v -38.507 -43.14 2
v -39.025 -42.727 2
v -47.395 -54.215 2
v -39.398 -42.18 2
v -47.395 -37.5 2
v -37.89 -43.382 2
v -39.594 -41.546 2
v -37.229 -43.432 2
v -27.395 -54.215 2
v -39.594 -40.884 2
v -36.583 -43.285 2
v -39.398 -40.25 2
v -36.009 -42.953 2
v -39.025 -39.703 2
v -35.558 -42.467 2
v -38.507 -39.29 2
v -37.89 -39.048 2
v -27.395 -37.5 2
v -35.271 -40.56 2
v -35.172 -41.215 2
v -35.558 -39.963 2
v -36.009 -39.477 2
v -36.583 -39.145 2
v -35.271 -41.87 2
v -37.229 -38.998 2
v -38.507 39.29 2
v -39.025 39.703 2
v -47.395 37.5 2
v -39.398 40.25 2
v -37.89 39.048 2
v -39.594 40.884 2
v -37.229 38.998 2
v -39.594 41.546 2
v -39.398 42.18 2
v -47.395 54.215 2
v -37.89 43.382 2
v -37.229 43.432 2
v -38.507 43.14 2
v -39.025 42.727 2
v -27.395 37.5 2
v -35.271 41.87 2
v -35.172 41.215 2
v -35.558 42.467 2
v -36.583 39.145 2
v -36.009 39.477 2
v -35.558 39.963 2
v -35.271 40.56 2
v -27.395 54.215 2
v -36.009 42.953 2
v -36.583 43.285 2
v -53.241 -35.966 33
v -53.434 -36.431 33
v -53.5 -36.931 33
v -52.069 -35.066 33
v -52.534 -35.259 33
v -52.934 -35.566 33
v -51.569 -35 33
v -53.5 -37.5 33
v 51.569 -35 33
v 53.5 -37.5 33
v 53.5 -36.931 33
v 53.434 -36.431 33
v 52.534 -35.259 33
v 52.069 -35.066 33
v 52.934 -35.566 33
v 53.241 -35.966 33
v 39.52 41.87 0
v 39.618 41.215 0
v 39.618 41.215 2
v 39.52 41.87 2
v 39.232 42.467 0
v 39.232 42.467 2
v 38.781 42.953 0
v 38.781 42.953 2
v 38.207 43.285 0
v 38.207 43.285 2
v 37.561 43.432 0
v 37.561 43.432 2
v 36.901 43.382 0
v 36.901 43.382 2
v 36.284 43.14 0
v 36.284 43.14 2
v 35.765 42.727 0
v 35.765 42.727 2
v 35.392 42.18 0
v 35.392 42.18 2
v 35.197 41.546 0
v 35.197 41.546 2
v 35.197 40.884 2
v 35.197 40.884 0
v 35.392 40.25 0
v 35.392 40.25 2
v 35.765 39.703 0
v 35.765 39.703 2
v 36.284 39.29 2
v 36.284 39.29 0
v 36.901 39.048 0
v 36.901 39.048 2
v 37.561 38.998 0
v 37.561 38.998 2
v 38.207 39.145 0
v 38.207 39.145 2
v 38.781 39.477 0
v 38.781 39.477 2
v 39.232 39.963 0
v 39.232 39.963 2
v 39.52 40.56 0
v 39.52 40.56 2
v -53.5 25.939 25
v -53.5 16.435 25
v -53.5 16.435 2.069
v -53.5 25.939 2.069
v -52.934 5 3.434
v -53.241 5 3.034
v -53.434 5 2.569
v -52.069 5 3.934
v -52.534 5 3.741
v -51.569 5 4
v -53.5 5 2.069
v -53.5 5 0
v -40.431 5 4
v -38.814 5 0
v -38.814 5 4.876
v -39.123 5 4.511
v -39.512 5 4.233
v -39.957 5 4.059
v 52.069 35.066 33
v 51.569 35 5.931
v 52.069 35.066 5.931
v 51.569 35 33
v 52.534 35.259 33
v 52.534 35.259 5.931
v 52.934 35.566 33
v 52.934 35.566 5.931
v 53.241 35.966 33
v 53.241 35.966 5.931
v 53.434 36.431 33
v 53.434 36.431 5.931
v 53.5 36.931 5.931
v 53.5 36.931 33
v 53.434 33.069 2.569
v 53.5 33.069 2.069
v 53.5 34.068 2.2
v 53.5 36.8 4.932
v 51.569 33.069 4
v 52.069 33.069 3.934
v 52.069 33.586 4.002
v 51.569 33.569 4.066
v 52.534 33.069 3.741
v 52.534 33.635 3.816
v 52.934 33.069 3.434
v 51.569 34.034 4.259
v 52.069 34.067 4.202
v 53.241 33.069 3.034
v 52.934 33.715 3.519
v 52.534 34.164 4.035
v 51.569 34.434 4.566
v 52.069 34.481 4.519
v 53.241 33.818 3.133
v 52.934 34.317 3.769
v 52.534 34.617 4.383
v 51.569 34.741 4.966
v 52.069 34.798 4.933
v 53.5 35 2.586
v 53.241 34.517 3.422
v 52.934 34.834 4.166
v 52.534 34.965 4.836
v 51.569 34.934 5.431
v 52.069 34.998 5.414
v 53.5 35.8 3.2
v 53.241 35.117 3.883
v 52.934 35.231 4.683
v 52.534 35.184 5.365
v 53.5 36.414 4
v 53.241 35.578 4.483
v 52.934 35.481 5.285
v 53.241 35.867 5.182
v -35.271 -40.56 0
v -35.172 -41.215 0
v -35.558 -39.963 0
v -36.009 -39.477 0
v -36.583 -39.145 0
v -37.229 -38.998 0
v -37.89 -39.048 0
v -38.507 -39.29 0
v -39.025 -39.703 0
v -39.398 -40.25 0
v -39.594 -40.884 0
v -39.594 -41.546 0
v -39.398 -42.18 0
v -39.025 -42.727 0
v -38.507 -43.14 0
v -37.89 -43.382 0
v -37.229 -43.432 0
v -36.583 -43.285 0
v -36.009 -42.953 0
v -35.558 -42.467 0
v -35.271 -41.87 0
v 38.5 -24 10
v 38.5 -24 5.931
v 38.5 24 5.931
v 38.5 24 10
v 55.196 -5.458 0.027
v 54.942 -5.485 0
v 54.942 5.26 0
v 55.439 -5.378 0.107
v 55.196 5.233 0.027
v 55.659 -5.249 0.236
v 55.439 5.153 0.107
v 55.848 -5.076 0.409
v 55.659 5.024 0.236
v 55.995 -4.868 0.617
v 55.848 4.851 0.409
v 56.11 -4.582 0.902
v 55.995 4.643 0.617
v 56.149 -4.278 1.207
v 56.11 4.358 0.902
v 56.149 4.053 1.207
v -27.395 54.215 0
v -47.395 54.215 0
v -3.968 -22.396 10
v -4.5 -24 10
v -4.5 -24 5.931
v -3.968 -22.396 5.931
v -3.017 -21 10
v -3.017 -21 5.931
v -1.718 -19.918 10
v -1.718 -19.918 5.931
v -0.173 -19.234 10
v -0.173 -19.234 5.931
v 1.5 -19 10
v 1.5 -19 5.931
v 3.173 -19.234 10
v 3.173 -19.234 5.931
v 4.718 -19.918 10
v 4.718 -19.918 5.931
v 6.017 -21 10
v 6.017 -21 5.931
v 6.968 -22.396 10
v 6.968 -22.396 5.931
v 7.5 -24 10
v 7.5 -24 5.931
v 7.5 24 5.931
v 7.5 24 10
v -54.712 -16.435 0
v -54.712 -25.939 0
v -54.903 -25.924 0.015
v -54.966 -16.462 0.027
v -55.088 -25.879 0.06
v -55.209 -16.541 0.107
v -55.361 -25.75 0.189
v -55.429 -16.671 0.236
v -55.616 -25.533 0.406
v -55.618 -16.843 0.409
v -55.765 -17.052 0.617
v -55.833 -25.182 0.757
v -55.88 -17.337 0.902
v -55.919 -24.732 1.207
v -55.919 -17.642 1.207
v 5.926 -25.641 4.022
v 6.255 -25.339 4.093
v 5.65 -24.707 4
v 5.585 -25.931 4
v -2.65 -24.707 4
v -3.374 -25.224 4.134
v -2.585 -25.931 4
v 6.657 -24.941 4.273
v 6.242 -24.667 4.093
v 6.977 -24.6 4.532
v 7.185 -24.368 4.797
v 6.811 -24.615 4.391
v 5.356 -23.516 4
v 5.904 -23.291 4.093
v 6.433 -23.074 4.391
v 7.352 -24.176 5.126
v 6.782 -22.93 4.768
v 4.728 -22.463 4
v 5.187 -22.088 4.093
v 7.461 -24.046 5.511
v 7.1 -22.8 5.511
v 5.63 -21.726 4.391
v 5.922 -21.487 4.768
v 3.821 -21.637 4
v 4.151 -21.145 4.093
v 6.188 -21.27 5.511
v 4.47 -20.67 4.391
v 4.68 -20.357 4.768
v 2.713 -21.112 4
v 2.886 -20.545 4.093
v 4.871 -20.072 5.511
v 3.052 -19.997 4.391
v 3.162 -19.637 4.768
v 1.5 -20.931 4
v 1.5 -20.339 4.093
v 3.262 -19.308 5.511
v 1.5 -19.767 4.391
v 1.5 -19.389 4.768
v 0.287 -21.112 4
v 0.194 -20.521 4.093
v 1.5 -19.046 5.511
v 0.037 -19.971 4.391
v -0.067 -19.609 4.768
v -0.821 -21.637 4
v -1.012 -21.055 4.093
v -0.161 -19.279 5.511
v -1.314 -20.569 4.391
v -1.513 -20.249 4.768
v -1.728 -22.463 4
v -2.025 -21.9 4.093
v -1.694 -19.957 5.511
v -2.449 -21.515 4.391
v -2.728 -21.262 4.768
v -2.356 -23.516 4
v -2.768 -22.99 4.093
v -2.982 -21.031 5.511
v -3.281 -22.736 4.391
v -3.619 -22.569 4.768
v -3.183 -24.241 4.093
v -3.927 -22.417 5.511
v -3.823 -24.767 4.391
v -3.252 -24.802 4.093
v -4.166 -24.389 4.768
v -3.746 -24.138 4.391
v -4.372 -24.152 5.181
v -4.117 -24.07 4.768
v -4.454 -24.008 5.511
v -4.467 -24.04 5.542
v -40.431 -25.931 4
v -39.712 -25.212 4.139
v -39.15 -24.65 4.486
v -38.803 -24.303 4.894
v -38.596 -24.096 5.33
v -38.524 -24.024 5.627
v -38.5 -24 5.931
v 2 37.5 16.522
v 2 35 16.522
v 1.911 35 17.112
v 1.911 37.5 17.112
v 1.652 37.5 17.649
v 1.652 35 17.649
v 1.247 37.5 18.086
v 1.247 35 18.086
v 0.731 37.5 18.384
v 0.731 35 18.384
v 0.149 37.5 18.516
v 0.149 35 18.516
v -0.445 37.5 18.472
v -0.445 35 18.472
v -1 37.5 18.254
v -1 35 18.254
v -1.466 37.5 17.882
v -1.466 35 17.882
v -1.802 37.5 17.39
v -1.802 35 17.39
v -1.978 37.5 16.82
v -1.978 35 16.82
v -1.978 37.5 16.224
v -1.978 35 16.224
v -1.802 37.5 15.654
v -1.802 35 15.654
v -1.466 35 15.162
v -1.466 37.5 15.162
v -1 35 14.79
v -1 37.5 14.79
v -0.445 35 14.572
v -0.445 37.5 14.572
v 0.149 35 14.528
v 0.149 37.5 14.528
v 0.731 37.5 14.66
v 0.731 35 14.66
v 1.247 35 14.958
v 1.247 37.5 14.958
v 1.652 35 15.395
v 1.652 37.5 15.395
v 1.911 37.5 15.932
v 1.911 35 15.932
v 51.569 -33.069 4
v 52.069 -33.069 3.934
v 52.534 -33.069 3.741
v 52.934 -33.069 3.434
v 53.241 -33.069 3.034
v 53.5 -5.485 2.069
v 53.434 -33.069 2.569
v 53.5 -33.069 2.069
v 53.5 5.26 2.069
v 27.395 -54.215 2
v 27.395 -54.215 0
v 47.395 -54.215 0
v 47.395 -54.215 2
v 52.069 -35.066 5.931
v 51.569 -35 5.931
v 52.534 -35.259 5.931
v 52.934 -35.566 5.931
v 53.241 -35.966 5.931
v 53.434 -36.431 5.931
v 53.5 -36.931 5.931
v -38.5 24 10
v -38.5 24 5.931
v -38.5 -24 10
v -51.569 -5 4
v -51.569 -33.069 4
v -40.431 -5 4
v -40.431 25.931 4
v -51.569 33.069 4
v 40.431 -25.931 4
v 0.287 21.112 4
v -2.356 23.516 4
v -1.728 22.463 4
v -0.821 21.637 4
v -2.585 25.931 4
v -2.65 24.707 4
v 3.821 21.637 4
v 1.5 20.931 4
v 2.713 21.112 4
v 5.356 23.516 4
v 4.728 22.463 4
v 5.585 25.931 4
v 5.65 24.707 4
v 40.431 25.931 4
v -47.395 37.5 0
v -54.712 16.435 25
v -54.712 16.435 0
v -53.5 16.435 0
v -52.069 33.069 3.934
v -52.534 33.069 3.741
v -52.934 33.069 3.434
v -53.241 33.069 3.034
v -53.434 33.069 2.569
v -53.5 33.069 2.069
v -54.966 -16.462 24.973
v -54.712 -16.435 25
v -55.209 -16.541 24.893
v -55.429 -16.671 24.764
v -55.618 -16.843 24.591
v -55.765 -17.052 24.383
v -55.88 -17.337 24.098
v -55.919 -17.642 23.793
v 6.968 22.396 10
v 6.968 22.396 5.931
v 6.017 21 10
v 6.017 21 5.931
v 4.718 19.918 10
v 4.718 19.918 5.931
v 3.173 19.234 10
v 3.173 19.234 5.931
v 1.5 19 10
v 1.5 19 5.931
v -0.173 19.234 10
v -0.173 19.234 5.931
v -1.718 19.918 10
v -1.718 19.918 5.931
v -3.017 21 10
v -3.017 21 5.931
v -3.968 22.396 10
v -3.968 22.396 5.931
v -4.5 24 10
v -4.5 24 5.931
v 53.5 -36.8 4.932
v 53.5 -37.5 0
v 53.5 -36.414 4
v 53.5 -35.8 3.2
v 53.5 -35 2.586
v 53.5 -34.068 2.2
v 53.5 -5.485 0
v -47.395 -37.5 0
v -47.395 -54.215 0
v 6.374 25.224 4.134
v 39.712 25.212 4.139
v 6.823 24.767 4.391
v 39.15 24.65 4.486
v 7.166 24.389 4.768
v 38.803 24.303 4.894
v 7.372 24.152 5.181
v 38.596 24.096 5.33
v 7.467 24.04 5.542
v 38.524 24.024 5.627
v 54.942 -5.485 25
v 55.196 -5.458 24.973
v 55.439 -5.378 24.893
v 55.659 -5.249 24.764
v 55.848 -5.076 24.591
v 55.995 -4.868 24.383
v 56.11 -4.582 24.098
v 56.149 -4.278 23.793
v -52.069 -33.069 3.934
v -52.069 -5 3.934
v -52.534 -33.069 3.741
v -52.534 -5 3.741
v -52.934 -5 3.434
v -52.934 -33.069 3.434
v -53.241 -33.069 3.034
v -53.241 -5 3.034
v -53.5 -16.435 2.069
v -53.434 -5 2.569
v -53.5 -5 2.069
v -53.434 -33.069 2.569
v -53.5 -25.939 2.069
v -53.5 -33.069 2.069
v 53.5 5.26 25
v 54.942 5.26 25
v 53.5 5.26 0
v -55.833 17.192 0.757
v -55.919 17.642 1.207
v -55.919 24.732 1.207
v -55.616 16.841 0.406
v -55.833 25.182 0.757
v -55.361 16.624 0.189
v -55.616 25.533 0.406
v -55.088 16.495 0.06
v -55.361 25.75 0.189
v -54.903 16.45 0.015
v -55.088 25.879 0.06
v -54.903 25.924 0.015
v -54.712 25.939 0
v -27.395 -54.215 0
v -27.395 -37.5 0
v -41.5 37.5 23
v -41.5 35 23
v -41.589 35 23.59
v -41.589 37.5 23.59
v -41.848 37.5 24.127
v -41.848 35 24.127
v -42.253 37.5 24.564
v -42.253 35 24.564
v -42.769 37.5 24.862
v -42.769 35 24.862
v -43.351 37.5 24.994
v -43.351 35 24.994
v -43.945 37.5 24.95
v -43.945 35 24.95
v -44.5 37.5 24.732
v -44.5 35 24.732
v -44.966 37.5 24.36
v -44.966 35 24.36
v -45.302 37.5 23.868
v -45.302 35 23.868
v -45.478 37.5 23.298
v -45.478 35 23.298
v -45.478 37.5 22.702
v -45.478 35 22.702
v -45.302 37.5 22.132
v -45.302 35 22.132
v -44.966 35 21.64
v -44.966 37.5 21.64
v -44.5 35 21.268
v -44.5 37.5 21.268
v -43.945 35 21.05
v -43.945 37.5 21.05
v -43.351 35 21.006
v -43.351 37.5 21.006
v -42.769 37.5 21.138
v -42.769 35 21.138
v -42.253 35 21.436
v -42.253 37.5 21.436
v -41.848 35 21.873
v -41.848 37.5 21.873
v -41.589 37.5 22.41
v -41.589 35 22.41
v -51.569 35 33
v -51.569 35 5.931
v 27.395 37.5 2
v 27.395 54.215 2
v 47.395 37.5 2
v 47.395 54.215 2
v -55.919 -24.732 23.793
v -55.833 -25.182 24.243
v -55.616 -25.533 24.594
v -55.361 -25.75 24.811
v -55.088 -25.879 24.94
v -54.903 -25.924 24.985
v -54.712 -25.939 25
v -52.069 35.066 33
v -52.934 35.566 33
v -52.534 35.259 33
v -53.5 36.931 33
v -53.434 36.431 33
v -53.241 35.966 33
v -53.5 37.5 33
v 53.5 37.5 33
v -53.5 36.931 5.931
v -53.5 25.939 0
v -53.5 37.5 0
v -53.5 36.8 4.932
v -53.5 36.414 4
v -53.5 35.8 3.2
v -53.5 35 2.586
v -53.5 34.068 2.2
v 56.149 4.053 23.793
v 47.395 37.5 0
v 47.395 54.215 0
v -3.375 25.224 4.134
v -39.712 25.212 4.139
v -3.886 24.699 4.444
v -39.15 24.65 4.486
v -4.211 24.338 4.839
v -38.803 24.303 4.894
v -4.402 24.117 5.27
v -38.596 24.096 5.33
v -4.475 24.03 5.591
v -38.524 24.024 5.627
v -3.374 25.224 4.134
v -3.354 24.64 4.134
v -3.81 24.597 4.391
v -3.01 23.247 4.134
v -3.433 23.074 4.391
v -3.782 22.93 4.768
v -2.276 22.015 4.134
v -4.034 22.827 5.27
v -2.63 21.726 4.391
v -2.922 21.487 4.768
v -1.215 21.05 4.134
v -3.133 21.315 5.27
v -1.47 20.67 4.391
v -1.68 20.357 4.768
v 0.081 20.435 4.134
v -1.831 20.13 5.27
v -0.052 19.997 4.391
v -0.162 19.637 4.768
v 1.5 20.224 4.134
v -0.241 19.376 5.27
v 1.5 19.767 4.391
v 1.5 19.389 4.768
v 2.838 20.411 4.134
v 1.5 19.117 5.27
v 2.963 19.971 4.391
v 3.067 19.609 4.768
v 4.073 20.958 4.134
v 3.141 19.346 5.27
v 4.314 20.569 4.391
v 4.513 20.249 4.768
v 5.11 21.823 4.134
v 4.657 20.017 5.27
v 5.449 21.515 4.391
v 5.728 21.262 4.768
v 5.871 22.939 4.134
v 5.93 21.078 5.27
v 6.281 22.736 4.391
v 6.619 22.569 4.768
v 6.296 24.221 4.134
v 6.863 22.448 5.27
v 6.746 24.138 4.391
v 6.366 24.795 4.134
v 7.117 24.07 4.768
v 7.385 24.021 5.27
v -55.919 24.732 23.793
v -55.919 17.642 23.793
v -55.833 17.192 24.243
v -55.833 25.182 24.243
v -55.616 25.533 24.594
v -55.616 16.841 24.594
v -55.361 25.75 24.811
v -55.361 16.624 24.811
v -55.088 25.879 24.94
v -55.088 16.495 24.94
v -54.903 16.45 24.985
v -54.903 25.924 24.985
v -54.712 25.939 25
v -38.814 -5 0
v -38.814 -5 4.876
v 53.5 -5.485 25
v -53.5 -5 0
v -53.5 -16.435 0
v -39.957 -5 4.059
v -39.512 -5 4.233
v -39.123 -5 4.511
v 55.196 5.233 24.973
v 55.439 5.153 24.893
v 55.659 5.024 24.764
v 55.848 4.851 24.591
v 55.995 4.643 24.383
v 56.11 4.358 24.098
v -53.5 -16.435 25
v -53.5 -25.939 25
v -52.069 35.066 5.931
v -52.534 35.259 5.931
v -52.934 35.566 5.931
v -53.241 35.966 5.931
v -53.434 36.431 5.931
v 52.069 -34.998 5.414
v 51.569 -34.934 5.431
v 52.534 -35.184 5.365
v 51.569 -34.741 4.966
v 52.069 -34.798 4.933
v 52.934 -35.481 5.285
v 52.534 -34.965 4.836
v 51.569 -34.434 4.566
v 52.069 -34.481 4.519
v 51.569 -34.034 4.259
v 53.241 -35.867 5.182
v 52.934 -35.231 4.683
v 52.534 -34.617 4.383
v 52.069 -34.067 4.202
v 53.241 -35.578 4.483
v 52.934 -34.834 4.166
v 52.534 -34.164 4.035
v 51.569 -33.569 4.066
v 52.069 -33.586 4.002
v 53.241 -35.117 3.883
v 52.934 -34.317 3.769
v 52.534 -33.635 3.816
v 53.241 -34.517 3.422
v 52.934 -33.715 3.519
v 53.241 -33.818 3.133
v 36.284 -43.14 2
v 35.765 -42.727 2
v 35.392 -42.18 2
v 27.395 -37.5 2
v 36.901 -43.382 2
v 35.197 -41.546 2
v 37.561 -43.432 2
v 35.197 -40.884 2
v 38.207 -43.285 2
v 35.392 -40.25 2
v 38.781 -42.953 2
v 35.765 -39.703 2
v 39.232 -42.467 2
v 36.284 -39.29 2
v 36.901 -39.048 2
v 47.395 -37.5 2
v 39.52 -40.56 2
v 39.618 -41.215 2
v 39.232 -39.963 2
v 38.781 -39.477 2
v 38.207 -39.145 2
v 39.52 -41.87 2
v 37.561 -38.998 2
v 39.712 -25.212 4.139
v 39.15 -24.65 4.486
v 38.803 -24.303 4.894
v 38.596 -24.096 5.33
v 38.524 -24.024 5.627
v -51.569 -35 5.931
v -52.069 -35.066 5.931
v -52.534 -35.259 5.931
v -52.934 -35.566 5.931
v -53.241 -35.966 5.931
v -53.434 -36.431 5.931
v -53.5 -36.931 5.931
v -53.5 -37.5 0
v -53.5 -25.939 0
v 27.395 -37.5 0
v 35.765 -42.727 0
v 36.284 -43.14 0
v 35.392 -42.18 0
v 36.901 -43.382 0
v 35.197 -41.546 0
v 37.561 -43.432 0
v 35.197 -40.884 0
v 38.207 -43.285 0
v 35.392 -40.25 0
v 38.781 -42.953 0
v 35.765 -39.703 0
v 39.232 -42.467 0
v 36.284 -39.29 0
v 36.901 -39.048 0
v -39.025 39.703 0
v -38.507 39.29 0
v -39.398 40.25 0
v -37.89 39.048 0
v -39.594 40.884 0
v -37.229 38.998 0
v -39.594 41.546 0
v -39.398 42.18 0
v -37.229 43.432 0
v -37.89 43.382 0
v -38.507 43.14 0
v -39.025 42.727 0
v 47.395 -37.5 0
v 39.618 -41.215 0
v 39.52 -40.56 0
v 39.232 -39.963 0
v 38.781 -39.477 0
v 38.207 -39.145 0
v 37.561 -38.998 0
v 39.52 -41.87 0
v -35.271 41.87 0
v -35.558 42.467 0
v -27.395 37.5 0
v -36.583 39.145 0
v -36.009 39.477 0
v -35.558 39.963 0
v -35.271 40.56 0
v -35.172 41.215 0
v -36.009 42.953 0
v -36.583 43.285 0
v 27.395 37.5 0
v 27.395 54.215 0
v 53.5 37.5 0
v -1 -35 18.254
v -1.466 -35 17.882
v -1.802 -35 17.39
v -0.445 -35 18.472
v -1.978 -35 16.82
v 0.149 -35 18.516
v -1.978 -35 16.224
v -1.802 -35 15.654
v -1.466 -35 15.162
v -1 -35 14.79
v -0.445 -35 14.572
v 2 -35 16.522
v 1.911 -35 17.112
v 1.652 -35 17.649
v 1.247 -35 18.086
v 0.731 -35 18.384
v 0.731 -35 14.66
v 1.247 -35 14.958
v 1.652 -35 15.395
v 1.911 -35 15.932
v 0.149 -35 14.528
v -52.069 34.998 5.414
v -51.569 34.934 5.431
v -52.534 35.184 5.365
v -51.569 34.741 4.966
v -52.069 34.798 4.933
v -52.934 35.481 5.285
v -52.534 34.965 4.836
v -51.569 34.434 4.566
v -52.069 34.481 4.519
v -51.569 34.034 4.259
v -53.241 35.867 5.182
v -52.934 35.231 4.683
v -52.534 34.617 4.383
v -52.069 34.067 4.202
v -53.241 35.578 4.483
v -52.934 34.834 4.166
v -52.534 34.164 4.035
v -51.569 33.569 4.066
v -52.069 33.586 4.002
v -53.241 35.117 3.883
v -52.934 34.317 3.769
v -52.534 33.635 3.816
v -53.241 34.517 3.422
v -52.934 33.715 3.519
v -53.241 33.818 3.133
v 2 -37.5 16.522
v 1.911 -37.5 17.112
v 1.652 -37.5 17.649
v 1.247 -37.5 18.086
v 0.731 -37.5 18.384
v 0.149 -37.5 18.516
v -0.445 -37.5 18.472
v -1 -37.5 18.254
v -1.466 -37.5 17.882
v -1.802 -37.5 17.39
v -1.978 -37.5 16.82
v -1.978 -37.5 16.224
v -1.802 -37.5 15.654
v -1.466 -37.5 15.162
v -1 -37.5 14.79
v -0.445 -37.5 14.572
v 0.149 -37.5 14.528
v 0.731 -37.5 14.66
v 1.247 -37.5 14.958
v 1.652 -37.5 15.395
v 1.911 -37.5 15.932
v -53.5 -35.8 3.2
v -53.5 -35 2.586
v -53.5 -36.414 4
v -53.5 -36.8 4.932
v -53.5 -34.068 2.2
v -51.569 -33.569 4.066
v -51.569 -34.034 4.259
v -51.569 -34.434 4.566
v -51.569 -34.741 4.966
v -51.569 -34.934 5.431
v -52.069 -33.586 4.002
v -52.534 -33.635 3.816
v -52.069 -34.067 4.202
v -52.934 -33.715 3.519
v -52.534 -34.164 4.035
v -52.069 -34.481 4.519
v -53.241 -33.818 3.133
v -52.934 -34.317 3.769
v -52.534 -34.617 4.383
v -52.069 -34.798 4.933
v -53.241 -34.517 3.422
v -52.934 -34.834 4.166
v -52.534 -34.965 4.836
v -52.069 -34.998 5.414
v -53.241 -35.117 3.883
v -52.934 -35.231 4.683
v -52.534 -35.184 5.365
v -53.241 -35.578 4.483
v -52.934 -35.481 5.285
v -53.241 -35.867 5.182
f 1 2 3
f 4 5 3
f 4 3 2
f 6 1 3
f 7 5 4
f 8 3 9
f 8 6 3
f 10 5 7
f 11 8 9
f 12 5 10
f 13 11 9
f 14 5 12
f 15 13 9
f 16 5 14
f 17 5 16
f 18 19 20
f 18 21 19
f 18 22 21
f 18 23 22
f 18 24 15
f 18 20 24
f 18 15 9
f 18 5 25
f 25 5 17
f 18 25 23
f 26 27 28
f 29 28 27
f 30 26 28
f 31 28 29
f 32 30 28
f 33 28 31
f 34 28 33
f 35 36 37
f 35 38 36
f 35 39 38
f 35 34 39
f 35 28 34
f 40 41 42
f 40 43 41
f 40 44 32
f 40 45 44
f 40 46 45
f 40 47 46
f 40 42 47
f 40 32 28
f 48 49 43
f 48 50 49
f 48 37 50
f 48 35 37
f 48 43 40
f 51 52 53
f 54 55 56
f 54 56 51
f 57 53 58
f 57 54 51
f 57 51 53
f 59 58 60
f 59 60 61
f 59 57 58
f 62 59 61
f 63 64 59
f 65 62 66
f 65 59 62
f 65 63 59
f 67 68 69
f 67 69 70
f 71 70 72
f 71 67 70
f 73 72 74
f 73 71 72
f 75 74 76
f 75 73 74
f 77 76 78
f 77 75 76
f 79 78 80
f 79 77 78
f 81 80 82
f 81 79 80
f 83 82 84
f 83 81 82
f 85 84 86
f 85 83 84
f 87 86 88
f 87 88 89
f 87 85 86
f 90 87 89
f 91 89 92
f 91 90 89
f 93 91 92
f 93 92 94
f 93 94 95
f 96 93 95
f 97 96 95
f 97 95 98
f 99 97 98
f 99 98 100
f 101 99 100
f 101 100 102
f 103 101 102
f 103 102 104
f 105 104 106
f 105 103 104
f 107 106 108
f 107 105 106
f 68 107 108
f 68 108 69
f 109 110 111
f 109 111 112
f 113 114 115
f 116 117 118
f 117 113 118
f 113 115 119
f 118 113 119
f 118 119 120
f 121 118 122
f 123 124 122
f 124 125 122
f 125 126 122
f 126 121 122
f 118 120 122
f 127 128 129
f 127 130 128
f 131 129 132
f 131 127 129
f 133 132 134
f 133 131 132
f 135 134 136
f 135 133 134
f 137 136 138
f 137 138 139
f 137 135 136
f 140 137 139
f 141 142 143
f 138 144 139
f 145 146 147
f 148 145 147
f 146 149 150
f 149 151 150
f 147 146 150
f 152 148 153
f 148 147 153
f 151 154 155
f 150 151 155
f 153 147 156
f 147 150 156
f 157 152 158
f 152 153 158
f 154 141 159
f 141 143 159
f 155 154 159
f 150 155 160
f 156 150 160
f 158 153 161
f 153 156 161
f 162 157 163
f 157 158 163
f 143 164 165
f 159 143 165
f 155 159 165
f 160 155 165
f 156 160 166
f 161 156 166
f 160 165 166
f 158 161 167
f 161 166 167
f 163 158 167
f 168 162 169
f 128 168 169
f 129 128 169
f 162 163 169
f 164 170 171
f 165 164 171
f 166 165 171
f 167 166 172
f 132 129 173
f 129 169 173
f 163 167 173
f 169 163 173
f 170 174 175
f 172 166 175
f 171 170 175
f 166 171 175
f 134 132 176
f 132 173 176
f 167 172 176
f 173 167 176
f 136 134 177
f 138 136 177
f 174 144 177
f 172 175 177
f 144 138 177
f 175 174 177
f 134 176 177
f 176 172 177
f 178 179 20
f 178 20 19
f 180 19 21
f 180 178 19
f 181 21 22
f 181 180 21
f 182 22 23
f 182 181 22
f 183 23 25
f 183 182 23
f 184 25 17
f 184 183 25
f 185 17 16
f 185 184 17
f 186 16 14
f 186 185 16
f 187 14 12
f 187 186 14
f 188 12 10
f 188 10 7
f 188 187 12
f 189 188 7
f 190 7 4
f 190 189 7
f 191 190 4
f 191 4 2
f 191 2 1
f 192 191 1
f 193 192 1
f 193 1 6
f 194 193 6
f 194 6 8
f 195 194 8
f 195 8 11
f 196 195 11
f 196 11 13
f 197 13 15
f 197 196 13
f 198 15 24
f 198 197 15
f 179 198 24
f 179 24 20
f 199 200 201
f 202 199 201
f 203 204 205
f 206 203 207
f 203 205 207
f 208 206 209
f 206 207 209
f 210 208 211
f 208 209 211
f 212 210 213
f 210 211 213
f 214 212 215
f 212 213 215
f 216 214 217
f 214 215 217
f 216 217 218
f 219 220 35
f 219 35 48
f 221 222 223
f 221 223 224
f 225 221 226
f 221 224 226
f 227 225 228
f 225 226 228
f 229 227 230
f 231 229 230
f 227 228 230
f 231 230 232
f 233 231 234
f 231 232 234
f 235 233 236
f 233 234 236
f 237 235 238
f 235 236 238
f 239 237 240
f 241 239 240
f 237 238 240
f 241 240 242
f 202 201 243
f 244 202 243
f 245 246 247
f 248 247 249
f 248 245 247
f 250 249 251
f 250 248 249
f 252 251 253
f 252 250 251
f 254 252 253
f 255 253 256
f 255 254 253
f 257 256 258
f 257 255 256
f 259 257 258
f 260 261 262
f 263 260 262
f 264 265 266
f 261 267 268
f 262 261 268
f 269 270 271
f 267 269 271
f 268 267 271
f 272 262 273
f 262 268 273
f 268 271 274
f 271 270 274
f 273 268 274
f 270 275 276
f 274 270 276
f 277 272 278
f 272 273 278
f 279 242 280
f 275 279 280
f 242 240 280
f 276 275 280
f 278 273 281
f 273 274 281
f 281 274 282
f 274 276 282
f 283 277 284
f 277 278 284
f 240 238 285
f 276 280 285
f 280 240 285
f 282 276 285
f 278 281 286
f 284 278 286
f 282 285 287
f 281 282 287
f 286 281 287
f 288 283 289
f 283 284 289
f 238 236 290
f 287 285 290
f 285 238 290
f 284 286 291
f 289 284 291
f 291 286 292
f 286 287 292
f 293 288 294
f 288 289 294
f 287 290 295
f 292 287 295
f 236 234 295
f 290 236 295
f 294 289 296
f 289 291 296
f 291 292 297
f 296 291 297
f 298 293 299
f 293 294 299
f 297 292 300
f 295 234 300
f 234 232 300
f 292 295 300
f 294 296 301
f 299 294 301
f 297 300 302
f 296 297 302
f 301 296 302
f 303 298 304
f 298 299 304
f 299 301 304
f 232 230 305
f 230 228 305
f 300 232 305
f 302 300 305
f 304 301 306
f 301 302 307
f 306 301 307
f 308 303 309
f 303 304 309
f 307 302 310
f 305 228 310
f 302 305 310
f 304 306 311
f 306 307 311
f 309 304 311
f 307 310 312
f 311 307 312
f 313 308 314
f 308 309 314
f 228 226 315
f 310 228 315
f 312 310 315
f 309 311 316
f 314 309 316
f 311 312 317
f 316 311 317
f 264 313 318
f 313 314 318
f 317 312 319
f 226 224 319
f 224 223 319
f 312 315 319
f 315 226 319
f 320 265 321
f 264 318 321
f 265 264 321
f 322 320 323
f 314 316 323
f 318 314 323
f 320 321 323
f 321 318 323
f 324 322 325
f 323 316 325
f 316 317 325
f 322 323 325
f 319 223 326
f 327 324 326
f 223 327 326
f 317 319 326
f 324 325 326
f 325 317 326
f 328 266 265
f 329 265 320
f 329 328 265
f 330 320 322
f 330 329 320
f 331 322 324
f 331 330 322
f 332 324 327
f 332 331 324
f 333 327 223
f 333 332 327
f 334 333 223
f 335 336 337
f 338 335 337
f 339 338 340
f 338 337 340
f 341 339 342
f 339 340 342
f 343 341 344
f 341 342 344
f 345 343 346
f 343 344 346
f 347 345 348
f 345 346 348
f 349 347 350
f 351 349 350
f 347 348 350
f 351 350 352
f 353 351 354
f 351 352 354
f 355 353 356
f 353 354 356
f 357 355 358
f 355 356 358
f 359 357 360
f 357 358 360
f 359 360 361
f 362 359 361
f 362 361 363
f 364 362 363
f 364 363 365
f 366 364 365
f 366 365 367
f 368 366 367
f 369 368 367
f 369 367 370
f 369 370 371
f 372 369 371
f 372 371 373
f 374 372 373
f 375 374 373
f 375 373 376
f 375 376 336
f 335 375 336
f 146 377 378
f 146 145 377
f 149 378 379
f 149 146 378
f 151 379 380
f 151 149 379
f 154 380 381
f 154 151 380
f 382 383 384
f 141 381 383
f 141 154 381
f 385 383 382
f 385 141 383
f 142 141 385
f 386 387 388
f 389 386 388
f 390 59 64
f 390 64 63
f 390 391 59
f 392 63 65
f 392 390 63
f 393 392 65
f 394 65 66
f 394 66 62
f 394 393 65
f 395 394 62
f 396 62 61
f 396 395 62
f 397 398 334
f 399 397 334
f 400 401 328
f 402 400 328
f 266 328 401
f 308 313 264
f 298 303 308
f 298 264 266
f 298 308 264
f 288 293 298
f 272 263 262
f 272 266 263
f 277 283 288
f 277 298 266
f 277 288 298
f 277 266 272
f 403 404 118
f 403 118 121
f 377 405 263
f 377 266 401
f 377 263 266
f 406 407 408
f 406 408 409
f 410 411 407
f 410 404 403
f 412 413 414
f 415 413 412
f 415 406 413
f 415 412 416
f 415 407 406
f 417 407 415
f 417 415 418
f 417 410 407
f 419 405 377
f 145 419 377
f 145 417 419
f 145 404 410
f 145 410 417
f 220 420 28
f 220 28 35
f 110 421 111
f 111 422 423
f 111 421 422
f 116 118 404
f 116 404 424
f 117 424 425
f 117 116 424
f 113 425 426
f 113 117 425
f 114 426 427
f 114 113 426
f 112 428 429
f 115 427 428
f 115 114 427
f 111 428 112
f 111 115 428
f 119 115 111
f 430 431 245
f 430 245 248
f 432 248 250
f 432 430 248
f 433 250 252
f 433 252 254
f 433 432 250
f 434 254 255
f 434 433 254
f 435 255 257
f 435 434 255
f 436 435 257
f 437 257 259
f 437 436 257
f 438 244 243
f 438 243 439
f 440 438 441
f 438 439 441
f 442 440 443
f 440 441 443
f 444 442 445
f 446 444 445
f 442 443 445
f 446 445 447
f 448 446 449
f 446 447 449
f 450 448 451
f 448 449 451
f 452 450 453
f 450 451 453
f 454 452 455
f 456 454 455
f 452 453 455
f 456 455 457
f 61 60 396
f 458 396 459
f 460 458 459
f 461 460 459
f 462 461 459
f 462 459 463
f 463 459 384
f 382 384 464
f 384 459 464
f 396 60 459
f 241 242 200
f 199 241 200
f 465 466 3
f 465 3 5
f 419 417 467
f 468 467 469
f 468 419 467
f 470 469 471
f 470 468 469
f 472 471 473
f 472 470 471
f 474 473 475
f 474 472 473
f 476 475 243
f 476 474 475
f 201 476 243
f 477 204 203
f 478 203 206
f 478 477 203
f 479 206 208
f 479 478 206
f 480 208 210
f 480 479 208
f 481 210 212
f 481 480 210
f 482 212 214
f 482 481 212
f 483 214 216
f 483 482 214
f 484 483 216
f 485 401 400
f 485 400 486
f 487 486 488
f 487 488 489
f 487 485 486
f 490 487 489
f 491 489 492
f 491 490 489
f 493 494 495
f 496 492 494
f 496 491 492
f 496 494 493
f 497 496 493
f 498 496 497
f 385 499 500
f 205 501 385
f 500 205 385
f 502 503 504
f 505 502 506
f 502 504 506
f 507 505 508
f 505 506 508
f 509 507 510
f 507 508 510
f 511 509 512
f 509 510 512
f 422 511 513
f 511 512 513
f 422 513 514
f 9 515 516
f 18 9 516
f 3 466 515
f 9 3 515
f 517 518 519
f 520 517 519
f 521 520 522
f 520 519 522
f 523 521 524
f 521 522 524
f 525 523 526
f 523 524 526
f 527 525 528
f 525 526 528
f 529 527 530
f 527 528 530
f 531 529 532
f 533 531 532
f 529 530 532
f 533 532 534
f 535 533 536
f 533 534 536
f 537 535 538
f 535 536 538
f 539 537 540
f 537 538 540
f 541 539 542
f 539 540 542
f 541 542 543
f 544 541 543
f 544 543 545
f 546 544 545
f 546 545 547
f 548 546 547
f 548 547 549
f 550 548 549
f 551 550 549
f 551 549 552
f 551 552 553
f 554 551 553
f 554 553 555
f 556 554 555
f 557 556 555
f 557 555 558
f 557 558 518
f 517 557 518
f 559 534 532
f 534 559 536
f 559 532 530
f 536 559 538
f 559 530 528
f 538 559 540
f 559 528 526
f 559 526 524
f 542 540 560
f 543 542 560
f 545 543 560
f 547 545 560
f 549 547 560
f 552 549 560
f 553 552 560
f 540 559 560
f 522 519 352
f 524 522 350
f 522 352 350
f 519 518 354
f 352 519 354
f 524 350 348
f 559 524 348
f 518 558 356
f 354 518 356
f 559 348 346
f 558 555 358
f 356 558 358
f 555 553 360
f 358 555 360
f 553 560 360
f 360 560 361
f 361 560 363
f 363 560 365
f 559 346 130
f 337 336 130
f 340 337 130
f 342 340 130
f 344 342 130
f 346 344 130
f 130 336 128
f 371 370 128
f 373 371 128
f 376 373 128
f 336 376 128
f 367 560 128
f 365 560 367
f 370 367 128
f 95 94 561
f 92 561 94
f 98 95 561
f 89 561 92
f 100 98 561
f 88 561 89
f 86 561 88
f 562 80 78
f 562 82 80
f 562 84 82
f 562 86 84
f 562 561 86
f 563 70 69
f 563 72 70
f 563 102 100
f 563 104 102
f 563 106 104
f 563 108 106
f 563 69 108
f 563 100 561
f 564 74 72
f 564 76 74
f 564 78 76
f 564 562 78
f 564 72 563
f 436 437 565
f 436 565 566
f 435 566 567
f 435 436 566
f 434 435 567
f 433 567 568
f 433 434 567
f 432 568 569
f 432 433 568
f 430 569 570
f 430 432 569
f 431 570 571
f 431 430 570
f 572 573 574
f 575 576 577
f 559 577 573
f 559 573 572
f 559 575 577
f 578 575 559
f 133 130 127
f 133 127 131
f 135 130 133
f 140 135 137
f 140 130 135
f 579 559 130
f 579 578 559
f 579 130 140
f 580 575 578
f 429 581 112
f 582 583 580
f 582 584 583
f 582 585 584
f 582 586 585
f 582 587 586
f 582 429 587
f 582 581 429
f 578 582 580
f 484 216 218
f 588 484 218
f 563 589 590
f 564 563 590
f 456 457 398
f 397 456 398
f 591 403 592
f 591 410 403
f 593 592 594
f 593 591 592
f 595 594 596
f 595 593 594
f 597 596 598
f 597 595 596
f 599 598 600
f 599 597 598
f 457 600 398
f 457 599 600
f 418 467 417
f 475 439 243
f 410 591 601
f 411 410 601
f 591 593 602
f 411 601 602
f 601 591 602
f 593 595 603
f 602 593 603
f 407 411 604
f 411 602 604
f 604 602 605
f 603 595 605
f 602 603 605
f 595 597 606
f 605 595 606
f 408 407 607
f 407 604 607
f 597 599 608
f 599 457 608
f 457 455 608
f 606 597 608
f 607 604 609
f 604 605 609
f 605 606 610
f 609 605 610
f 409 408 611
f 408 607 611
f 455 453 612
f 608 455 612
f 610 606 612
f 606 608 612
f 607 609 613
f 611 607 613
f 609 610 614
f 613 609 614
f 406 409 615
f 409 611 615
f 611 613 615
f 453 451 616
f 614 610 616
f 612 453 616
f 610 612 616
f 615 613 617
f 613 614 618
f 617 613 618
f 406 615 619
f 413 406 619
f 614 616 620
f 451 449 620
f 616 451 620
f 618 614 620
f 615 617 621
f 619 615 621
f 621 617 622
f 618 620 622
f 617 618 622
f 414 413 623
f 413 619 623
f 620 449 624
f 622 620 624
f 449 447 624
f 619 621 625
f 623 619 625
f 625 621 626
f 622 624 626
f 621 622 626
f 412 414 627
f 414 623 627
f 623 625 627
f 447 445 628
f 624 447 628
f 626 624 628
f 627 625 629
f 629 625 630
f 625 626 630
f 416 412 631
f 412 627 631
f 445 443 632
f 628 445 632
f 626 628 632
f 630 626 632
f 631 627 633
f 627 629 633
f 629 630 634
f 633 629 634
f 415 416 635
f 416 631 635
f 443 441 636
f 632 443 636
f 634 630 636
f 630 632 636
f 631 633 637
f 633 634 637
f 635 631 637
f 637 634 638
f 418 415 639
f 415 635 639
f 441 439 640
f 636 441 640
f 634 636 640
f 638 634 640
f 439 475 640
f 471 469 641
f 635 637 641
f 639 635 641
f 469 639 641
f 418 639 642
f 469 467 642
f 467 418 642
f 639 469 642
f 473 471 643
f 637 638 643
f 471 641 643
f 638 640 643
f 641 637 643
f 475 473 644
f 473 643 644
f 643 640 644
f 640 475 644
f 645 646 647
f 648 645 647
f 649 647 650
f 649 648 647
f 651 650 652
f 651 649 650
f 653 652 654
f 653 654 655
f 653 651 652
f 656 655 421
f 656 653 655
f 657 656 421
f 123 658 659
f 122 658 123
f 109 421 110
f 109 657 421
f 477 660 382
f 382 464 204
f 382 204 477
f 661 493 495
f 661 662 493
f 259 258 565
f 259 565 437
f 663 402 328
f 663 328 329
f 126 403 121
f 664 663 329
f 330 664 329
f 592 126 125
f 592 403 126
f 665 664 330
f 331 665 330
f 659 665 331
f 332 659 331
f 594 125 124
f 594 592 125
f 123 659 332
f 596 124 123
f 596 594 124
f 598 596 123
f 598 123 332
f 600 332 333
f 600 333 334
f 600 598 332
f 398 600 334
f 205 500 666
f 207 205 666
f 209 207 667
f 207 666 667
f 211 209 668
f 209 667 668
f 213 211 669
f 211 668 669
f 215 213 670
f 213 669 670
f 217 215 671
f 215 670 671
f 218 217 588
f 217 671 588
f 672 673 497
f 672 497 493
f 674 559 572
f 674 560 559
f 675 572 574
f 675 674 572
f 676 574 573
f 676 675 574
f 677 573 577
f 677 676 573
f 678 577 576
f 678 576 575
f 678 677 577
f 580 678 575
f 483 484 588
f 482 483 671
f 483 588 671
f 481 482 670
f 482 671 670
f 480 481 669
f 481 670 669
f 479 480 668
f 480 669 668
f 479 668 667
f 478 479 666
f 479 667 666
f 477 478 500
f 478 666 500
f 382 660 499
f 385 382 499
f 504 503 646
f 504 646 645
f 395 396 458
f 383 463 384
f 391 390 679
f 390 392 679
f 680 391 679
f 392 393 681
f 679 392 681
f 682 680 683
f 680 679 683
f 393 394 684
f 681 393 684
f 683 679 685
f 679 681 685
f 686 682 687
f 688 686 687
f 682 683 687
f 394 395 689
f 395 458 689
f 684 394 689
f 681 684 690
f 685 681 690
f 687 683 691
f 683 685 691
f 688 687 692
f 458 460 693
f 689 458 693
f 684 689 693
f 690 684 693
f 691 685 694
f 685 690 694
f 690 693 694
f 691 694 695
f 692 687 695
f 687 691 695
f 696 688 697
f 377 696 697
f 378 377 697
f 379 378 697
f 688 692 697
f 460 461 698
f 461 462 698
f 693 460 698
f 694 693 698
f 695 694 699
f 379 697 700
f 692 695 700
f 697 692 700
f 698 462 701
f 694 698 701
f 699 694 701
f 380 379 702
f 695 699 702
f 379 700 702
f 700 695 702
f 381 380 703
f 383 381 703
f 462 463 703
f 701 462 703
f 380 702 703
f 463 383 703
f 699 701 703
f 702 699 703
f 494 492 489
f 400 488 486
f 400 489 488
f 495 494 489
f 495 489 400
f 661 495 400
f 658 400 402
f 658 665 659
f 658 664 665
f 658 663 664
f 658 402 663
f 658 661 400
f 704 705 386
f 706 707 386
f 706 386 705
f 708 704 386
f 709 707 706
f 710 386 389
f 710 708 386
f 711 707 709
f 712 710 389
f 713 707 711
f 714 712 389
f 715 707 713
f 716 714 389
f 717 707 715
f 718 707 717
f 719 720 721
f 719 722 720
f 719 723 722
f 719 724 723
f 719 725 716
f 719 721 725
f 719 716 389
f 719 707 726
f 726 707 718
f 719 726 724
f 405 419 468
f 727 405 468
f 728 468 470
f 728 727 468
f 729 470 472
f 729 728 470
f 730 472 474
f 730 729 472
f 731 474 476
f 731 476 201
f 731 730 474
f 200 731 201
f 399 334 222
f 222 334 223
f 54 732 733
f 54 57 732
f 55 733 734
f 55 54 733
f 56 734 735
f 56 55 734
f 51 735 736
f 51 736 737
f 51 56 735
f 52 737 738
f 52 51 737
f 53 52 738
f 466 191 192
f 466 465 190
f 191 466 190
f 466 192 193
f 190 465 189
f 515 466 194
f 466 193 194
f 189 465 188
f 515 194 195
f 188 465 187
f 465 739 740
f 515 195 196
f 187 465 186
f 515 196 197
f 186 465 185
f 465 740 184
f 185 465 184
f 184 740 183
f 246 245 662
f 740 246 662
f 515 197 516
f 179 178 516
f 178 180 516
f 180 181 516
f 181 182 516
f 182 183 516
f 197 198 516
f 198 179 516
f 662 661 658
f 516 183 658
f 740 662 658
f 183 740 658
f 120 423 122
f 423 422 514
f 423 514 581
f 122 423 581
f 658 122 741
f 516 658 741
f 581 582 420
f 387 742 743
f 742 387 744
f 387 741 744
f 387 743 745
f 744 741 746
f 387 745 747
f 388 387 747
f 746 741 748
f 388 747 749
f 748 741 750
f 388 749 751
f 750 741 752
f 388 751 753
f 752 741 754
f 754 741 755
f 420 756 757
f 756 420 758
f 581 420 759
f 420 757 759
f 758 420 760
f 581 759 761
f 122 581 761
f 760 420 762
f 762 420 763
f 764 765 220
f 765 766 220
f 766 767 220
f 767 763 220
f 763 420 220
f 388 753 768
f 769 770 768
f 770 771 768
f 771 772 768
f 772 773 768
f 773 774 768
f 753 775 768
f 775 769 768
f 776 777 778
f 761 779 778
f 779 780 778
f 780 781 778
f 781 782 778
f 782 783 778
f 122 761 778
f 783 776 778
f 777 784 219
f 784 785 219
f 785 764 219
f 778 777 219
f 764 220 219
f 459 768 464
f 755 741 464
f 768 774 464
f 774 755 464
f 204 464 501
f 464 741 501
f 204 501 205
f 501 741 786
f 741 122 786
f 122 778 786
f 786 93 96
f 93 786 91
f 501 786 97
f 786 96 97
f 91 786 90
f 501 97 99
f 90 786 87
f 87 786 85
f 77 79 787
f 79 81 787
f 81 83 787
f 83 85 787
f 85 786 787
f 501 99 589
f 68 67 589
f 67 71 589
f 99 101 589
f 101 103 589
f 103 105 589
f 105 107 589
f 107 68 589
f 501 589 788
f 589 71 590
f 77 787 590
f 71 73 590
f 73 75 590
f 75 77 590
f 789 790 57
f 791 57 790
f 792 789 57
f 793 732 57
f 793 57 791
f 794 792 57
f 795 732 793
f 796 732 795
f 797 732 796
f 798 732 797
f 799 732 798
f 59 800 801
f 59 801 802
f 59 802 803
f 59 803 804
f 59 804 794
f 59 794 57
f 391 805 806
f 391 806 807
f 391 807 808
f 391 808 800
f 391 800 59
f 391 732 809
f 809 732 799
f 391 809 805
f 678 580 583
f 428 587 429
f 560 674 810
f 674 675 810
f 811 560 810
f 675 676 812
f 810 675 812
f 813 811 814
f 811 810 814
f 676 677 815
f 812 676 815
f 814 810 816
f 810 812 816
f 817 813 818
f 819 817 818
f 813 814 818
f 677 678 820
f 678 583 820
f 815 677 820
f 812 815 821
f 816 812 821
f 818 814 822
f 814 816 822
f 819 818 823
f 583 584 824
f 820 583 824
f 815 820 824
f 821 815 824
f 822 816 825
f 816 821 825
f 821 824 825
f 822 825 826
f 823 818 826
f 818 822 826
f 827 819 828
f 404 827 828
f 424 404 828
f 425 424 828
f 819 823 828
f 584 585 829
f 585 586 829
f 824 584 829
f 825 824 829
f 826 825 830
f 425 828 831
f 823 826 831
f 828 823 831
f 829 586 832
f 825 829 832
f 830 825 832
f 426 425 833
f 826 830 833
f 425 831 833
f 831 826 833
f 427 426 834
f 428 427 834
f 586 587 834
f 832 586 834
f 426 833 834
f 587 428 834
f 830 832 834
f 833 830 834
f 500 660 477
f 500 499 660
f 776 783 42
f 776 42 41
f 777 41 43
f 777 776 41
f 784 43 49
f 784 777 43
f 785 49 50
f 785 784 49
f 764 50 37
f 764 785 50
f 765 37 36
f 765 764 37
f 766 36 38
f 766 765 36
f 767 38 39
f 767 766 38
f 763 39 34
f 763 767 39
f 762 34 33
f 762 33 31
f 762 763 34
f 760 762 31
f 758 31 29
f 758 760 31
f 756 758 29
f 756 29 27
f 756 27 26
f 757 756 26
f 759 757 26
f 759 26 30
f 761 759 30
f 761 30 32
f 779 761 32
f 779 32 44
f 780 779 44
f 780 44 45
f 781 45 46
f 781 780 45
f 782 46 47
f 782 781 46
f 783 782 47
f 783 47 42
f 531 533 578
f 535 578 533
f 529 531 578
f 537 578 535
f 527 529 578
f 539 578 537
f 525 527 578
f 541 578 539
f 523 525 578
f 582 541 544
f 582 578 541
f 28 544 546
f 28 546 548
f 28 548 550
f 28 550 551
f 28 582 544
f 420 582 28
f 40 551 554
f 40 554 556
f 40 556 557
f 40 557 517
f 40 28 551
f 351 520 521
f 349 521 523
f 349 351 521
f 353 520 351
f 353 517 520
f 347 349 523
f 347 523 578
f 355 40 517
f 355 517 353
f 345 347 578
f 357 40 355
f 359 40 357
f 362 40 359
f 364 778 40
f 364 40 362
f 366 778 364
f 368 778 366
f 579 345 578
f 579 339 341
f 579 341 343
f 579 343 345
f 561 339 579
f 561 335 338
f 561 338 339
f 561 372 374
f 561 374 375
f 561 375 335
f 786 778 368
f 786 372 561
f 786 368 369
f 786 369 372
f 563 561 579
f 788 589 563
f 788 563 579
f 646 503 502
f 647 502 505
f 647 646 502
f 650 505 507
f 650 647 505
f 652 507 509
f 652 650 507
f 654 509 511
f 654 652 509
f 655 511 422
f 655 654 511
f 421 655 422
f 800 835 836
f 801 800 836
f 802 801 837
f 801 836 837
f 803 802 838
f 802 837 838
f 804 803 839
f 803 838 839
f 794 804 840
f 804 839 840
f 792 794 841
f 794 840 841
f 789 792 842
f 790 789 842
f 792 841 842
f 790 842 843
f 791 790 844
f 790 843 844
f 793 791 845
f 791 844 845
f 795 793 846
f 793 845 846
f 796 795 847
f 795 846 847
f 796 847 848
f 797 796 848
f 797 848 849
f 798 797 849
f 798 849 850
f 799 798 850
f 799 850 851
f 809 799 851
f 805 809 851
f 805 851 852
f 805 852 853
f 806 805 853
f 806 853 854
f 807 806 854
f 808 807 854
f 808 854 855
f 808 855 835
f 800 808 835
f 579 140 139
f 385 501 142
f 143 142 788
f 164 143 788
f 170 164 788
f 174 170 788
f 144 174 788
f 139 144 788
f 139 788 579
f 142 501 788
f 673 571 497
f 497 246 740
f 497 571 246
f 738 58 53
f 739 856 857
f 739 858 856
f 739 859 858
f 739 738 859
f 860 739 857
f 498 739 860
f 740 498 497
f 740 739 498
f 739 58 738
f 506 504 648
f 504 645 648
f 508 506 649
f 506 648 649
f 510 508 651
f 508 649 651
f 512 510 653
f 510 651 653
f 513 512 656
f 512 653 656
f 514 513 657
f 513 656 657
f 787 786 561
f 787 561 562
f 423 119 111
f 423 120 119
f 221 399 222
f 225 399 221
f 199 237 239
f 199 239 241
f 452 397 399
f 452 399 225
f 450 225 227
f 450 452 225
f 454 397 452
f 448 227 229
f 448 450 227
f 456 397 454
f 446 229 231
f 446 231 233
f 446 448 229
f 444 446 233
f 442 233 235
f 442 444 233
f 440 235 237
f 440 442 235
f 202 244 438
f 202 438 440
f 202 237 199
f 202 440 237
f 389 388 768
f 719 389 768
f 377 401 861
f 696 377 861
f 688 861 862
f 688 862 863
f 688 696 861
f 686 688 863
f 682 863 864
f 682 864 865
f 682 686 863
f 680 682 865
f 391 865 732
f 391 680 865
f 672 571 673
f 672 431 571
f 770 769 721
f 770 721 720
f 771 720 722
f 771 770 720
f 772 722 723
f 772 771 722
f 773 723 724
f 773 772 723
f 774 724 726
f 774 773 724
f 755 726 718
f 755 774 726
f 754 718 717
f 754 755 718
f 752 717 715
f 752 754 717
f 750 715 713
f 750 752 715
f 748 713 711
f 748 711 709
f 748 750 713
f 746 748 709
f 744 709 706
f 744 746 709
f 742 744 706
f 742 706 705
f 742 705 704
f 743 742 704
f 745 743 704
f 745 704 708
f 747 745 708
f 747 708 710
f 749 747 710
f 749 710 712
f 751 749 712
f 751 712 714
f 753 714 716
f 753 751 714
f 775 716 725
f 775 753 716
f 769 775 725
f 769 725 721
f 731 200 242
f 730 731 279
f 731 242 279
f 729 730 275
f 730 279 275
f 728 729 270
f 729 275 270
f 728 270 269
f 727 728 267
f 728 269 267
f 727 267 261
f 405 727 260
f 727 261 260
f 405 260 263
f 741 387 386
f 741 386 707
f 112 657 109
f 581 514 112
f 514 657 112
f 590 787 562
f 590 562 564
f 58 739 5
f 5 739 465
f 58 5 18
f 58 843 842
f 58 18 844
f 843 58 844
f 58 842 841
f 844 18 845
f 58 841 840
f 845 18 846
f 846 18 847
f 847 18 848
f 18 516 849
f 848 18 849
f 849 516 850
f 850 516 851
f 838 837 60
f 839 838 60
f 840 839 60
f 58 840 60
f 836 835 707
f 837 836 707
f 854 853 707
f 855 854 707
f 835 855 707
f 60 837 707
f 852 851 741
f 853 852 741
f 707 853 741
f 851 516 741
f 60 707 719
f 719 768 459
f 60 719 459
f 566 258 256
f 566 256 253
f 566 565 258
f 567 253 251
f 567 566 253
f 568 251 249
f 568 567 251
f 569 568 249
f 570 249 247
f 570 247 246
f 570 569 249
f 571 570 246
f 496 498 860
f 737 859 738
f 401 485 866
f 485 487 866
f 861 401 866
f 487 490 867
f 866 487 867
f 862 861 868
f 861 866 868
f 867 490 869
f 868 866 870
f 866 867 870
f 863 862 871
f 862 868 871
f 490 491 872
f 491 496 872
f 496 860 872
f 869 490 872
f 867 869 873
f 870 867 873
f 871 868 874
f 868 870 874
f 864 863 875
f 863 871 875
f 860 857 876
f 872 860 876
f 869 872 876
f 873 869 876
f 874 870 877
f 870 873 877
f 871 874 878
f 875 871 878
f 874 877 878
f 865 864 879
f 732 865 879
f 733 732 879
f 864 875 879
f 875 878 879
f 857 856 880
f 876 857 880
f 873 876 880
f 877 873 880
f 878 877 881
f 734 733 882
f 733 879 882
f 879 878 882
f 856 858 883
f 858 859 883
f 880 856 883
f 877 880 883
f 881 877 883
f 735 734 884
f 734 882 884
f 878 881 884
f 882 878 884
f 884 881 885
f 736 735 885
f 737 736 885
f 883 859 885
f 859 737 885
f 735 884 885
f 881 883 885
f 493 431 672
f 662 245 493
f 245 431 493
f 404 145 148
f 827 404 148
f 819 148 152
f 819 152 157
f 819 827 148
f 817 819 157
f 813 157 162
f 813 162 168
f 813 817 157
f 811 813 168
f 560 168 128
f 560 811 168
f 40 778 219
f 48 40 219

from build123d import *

# Parameters (mm, degrees)
F1_DEPTH  = 4
F0_W      = 107
F0_H      = 2.5
F2_DEPTH  = 33
F3_W      = 20
F3_H      = 19.215
F3_R      = 2.2232187412
F4_DEPTH  = 2
F6_D      = 4
F6_DEPTH  = 12
F6_TIP    = 1.2017212381
F7_D      = 4
F8_DEPTH  = 10
F9_F1_R   = 1.9313708499
F9_F2_R   = 1.9313708499
F10_W     = 15
F10_H     = 10
F11_DEPTH = 11.3
F0_W_2    = 2.4193752706
F0_H_2    = 9.5048956573
F0_W_3    = 2.649404496
F0_H_3    = 10.744664818
F12_DEPTH = 25
F13_R     = 1.2071067812


with BuildPart() as f1:
    # F0 (on Top) → F1 (new body)
    with BuildSketch(Plane.XY):
        Polygon((-53.5, -35), (53.5, -35), (53.5, -5.4848068394), (53.5, 5.2598579787), (53.5, 35), (-53.5, 35), (-53.5, 25.9394217283), (-53.5, 16.434526071), (-53.5, -16.434526071), (-53.5, -25.9394217283), align=None)
        with BuildLine():
            Line((38.5, 24), (38.5, -24))
            Line((38.5, -24), (7.5, -24))
            ThreePointArc((7.5, -24), (1.5, -19), (-4.5, -24))
            Line((-4.5, -24), (-38.5, -24))
            Line((-38.5, -24), (-38.5, 24))
            Line((-38.5, 24), (-4.5, 24))
            ThreePointArc((-4.5, 24), (1.5, 19), (7.5, 24))
            Line((7.5, 24), (38.5, 24))
        make_face(mode=Mode.SUBTRACT)
    extrude(amount=F1_DEPTH)

    # F0 (on Top) → F2 (join)
    with BuildSketch(Plane.XY):
        with Locations((0, 36.25)):
            Rectangle(F0_W, F0_H)
        with Locations((0, -36.25)):
            Rectangle(F0_W, F0_H)
    extrude(amount=F2_DEPTH)

    # F3 (on face) → F4 (join)
    with BuildSketch(Plane.XY):
        with Locations((-37.3952314258, -44.6075)):
            Rectangle(F3_W, F3_H)
        with Locations((-37.3952314258, -41.215)):
            Circle(F3_R, mode=Mode.SUBTRACT)
        with Locations((37.3952314258, -44.6075)):
            Rectangle(F3_W, F3_H)
        with Locations((37.3952314258, -41.215)):
            Circle(F3_R, mode=Mode.SUBTRACT)
        with Locations((37.3952314258, 44.6075)):
            Rectangle(F3_W, F3_H)
        with Locations((37.3952314258, 41.215)):
            Circle(F3_R, mode=Mode.SUBTRACT)
        with Locations((-37.3952314258, 44.6075)):
            Rectangle(F3_W, F3_H)
        with Locations((-37.3952314258, 41.215)):
            Circle(F3_R, mode=Mode.SUBTRACT)
    extrude(amount=F4_DEPTH)

    # F6
    with Locations(Plane(origin=(0, 37.5, 0), x_dir=(-1, 0, 0), z_dir=(0, 1, 0))):
        with Locations((43.5, 23)):
            Hole(F6_D / 2, depth=F6_DEPTH)
            with Locations((0, 0, -(F6_DEPTH + F6_TIP / 2))):  # 118° drill point
                Cone(0, F6_D / 2, F6_TIP, mode=Mode.SUBTRACT)

    # F7 (through all)
    with Locations(Plane(origin=(0, 37.5, 0), x_dir=(-1, 0, 0), z_dir=(0, 1, 0))):
        with Locations((0, 16.522007063)):
            Hole(F7_D / 2)

    # F0 (on Top) → F8 (join)
    with BuildSketch(Plane.XY):
        with BuildLine():
            Line((7.5, -24), (38.5, -24))
            Line((38.5, -24), (38.5, 24))
            Line((38.5, 24), (7.5, 24))
            ThreePointArc((7.5, 24), (1.5, 19), (-4.5, 24))
            Line((-4.5, 24), (-38.5, 24))
            Line((-38.5, 24), (-38.5, -24))
            Line((-38.5, -24), (-4.5, -24))
            ThreePointArc((-4.5, -24), (1.5, -19), (7.5, -24))
        make_face()
    extrude(amount=F8_DEPTH)

    # F9: fillet of radius 1.9313708499 on 12 edges, made by hand

    # F9_f1
    f9_f1_edges = [f1.edges().sort_by_distance(p)[0] for p in [
        (0, -35, 4),
        (0, 35, 4),
        (1.5, 19, 4),
        (23, 24, 4),
        (38.5, 0, 4),
        (23, -24, 4),
        (1.5, -19, 4),
        (-21.5, -24, 4),
        (-38.5, 0, 4),
        (-21.5, 24, 4),
    ]]
    fillet(f9_f1_edges, radius=F9_F1_R)

    # F9_f2
    f9_f2_edges = [f1.edges().sort_by_distance(p)[0] for p in [
        (53.5, 0, 4),
        (-53.5, 0, 4),
        (-53.5, -34.4343145751, 4.5656854249),
        (-53.5, 34.4343145751, 4.5656854249),
        (53.5, 34.4343145751, 4.5656854249),
        (53.5, -34.4343145751, 4.5656854249),
    ]]
    fillet(f9_f2_edges, radius=F9_F2_R)

    # F10 (on face) → F11 (cut)
    with BuildSketch(Plane.XY):
        with Locations((-46.3137403131, 0)):
            Rectangle(F10_W, F10_H)
    extrude(amount=F11_DEPTH, mode=Mode.SUBTRACT)

    # F0 (on Top) → F12 (join)
    with BuildSketch(Plane.XY):
        with Locations((-54.7096876353, 21.1869738996)):
            Rectangle(F0_W_2, F0_H_2)
        with Locations((-54.7096876353, -21.1869738996)):
            Rectangle(F0_W_2, F0_H_2)
        with Locations((54.824702248, -0.1124744304)):
            Rectangle(F0_W_3, F0_H_3)
    extrude(amount=F12_DEPTH)

    # F13
    f13_edges = [f1.edges().sort_by_distance(p)[0] for p in [
        (-55.919375, 25.939422, 12.5),
        (-55.919375, 16.434526, 12.5),
        (-55.919375, 21.186974, 0),
        (-55.919375, 21.186974, 25),
        (-55.919375, -16.434526, 12.5),
        (-55.919375, -25.939422, 12.5),
        (-55.919375, -21.186974, 0),
        (-55.919375, -21.186974, 25),
        (56.149404, -5.484807, 12.5),
        (56.149404, 5.259858, 12.5),
        (56.149404, -0.112474, 0),
        (56.149404, -0.112474, 25),
    ]]
    fillet(f13_edges, radius=F13_R)


solid = f1.part
